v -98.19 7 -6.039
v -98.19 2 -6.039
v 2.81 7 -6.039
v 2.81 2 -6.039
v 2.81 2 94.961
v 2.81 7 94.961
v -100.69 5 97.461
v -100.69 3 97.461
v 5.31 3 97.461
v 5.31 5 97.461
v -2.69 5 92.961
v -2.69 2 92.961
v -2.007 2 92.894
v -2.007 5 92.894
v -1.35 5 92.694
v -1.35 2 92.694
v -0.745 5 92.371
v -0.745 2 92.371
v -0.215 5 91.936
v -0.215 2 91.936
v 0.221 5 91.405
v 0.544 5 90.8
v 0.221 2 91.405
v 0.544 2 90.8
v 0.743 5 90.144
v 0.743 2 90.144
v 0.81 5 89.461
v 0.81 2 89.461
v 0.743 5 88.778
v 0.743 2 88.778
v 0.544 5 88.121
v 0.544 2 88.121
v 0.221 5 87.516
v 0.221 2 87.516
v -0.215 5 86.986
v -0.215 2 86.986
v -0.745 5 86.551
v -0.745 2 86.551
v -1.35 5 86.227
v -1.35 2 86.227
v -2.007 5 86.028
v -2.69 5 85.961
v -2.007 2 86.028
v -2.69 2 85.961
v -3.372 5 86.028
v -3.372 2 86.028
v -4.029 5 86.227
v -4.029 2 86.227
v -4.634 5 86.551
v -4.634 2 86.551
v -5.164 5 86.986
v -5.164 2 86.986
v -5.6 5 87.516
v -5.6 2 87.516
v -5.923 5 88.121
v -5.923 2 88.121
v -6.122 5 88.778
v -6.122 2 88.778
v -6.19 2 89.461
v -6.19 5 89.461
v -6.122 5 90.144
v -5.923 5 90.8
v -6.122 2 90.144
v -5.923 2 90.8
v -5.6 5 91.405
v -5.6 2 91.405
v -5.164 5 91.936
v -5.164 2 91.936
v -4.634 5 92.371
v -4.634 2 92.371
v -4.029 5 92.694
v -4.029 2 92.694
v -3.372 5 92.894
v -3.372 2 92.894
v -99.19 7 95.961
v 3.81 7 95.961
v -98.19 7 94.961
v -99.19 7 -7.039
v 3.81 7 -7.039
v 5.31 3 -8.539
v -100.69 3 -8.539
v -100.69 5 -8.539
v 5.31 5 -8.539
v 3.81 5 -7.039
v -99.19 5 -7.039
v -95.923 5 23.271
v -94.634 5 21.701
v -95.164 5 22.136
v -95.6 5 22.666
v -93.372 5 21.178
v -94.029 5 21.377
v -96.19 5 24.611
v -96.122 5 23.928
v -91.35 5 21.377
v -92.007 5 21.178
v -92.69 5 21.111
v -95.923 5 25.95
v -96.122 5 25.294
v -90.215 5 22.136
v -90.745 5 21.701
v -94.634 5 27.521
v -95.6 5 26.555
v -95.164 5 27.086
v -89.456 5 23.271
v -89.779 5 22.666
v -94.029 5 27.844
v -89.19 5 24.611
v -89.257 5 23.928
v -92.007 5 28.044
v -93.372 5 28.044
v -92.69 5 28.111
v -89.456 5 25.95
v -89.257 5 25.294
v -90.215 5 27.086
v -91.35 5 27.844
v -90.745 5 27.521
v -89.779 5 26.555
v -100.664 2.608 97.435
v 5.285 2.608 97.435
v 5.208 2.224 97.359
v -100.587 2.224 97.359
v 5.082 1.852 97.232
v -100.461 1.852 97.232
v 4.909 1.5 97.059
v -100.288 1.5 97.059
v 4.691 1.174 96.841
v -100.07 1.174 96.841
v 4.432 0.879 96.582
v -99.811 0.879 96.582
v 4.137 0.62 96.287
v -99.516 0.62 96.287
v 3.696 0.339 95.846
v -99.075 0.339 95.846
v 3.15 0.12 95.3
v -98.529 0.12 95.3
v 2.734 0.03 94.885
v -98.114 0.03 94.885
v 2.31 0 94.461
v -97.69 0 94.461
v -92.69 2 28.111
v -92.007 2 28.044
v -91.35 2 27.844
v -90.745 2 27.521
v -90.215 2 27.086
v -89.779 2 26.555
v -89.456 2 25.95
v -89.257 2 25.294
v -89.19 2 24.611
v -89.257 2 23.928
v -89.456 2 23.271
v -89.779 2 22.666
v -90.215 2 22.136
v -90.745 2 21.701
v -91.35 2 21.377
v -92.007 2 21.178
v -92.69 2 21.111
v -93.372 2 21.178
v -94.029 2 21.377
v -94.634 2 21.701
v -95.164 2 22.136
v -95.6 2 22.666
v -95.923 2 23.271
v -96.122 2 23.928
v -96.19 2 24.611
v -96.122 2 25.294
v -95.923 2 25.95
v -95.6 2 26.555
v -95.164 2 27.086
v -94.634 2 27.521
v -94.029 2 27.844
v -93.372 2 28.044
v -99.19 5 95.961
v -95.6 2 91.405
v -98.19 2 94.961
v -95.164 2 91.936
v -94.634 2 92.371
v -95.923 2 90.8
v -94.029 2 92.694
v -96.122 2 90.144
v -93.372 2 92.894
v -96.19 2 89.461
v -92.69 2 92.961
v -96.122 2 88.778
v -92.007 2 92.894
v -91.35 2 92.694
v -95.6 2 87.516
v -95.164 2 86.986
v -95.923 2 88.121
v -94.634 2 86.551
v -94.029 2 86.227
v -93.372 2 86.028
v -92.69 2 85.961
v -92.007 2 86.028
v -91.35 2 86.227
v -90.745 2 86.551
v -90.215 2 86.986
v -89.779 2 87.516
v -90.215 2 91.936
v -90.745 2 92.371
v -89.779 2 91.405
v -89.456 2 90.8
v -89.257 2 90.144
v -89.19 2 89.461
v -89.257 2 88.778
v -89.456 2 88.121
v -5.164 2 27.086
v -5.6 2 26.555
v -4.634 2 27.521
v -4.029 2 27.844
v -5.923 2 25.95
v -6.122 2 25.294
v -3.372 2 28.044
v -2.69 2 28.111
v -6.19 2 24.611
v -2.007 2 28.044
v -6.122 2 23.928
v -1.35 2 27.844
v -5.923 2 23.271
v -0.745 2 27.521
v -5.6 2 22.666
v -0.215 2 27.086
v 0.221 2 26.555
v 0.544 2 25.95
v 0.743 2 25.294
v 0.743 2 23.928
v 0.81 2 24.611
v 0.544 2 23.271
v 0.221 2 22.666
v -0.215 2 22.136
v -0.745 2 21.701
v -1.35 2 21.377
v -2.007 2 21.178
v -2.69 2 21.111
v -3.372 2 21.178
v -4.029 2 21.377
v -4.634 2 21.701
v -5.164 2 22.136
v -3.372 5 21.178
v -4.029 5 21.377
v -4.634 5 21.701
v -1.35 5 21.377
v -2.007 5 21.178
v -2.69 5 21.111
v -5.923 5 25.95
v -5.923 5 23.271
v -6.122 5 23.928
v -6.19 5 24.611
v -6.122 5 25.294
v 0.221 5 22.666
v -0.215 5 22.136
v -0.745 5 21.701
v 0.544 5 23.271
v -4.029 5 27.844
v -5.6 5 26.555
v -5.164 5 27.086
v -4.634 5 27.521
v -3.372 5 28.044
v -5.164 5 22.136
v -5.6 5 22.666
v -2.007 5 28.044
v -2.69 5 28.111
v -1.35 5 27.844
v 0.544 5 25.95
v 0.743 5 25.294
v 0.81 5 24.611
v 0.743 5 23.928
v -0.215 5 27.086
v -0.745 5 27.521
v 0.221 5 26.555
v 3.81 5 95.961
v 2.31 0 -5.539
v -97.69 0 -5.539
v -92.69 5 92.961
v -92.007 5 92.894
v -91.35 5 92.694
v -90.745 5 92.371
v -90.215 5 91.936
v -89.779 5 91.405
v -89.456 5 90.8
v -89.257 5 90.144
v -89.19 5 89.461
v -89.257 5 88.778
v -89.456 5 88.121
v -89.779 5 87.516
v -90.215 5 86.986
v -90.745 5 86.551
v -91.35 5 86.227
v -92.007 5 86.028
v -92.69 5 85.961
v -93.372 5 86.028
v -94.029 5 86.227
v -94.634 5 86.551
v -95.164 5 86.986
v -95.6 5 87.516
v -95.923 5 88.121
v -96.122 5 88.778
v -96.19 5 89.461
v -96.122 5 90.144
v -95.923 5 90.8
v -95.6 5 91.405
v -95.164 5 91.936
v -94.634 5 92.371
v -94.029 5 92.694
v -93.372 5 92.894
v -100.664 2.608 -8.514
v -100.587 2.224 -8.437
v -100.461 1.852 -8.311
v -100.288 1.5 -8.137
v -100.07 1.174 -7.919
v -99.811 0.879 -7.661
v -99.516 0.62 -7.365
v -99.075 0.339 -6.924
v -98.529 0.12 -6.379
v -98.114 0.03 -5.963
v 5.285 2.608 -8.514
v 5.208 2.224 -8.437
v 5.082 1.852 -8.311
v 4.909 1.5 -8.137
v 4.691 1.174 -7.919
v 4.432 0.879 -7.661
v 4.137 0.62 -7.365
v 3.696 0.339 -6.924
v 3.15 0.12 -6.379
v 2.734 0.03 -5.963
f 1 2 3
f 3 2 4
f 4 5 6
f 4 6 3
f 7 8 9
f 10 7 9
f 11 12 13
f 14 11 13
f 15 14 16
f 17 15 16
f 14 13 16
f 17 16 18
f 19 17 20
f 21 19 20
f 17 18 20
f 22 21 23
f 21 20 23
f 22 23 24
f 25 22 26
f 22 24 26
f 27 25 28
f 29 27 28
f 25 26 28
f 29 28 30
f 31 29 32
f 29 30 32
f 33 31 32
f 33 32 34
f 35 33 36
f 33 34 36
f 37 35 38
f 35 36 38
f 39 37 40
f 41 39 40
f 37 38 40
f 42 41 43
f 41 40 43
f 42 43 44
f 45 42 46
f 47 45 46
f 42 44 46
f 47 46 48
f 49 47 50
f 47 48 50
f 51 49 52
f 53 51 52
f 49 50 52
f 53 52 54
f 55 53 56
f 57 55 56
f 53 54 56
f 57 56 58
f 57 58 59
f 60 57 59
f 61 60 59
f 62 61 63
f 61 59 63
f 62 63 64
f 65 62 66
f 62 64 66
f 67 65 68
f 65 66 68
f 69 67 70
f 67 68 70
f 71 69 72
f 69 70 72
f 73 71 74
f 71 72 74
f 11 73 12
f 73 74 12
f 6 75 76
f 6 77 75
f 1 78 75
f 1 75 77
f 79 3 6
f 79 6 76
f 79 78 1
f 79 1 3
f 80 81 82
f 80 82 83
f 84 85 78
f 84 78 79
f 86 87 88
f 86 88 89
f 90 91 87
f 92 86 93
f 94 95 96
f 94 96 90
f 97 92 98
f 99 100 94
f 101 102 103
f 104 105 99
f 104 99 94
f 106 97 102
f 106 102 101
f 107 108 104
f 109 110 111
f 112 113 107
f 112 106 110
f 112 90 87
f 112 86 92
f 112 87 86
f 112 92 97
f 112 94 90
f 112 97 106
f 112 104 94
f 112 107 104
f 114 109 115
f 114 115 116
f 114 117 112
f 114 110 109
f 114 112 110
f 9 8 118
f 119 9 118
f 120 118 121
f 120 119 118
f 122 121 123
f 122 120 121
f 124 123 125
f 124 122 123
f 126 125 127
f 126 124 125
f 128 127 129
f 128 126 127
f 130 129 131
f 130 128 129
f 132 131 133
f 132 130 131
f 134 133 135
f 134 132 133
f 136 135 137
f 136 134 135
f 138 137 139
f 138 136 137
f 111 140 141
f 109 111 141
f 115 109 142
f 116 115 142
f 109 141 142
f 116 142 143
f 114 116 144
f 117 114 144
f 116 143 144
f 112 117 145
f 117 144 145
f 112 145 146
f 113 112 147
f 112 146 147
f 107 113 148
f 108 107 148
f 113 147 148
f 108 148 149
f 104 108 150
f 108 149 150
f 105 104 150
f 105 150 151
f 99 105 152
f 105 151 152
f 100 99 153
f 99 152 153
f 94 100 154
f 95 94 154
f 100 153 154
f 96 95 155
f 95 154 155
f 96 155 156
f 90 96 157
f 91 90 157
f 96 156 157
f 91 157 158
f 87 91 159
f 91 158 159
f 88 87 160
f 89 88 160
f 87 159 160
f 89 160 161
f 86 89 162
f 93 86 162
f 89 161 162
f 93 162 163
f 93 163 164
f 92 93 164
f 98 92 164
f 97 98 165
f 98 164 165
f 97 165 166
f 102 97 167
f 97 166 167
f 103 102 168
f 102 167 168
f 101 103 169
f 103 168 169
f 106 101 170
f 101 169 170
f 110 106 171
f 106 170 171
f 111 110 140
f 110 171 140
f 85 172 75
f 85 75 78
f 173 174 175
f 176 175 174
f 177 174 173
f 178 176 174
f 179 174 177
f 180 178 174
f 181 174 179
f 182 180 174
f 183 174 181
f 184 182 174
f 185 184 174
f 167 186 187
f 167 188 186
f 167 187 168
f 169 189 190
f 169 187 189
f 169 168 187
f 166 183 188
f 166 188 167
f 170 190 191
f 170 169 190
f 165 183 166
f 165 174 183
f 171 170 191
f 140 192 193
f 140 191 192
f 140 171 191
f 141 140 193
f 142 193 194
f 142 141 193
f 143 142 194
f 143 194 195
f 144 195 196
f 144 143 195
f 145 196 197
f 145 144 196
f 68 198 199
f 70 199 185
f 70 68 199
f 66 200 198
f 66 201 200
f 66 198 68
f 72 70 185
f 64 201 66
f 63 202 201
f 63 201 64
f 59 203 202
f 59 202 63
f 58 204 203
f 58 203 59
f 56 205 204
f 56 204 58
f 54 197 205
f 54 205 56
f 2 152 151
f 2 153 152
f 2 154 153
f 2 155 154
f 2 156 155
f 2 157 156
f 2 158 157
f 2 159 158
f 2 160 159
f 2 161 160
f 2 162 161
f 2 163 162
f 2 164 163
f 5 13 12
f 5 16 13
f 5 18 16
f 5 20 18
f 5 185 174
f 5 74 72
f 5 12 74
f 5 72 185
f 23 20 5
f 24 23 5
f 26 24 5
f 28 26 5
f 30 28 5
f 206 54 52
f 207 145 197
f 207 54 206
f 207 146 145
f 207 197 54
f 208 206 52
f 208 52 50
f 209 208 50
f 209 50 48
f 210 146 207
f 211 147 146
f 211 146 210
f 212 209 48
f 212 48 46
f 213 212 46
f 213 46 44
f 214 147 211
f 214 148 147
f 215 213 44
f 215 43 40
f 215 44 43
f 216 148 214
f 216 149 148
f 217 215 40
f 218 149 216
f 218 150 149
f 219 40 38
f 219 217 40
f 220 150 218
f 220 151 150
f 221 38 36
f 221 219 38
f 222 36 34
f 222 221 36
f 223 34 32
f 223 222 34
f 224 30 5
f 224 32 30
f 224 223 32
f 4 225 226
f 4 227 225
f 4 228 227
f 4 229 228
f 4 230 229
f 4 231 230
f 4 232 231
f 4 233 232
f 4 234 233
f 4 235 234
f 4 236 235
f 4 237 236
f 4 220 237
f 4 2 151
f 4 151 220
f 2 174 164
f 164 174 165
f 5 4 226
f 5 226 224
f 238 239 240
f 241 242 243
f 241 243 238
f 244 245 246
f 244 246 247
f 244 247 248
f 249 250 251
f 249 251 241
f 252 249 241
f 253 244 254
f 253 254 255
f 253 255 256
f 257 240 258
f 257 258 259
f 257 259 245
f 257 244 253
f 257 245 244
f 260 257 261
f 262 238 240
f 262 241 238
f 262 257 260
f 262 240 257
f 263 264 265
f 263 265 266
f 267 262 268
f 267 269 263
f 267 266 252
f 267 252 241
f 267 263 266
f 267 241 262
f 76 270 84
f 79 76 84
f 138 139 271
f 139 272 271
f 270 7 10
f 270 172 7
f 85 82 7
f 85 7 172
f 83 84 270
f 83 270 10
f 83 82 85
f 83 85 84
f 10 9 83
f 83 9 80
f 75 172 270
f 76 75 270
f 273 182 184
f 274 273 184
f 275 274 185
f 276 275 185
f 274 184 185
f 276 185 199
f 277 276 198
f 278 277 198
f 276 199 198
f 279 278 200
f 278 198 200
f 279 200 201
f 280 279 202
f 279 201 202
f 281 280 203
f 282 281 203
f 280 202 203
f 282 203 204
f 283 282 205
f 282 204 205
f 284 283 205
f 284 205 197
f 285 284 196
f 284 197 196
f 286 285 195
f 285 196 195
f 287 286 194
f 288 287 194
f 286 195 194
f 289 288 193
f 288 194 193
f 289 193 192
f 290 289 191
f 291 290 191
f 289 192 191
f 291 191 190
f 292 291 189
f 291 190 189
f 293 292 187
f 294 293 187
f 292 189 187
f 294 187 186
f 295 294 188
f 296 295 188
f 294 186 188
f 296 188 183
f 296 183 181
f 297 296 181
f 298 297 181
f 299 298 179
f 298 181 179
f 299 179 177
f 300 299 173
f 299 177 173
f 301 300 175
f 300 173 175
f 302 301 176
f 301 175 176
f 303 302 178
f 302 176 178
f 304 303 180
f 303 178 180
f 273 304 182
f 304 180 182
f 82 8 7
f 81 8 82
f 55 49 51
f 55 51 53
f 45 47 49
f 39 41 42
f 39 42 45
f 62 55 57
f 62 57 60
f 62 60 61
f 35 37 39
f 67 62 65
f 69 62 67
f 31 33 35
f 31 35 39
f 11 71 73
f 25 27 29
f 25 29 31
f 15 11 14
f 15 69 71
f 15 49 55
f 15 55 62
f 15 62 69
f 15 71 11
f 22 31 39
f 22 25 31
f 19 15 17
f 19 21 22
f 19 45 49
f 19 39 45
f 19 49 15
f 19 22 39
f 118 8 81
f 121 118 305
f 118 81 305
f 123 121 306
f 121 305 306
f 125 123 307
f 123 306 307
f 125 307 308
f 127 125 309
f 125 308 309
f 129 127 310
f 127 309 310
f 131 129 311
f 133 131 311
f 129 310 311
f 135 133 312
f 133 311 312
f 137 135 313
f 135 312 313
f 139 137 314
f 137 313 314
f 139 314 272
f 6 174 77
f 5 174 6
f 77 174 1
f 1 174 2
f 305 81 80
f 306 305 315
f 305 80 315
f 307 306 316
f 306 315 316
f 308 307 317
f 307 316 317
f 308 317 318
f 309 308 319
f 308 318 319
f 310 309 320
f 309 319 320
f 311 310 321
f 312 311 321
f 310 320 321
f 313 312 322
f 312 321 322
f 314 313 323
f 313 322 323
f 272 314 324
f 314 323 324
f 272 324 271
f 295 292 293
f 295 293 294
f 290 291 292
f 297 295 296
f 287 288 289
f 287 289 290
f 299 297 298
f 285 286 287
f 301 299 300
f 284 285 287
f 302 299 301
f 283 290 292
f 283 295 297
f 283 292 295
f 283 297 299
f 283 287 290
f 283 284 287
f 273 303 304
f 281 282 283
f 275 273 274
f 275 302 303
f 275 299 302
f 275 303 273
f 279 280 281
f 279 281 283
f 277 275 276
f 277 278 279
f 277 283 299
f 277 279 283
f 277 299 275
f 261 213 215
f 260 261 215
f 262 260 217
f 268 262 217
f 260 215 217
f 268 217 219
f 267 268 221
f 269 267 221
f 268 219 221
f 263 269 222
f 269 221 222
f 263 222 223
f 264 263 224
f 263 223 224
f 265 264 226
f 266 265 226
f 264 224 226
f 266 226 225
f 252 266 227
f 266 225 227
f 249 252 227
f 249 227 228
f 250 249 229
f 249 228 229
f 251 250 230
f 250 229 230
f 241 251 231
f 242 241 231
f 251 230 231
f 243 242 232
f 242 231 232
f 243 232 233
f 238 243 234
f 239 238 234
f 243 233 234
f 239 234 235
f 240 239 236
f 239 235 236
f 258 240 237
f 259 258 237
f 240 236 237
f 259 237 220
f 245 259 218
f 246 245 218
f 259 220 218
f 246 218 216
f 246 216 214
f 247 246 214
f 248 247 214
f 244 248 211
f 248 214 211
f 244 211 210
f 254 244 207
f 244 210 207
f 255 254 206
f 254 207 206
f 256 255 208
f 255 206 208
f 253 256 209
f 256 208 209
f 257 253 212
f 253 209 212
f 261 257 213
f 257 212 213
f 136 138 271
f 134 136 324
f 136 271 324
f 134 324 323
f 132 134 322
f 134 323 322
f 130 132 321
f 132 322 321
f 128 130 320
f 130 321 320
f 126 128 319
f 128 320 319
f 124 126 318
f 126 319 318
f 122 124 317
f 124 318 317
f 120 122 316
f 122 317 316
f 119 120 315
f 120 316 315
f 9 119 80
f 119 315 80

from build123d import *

# Parameters (mm, degrees)
SKETCH4_W           = 106
SKETCH4_H           = 106
BOSS_EXTRUDE3_DEPTH = 5
SKETCH6_W           = 101
SKETCH6_H           = 101
CUT_EXTRUDE2_DEPTH  = 3
SKETCH7_R           = 3.5
BOSS_EXTRUDE4_DEPTH = 3
FILLET1_R           = 3
SKETCH10_W          = 103
SKETCH10_H          = 103
SKETCH10_W_2        = 101
SKETCH10_H_2        = 101
BOSS_EXTRUDE5_DEPTH = 2


with BuildPart() as part:
    # Sketch4 → Boss-Extrude3 (new body)
    with BuildSketch(Plane(origin=(0, 0, 0), x_dir=(1, 0, 0), z_dir=(0, 1, 0))):
        with Locations((-47.689542484, -44.460784314)):
            Rectangle(SKETCH4_W, SKETCH4_H)
    extrude(amount=BOSS_EXTRUDE3_DEPTH)

    # Sketch6 → Cut-Extrude2 (cut)
    with BuildSketch(Plane(origin=(0, 5, 0), x_dir=(1, 0, 0), z_dir=(0, 1, 0))):
        with Locations((-47.689542484, -44.460784314)):
            Rectangle(SKETCH6_W, SKETCH6_H)
    extrude(amount=-CUT_EXTRUDE2_DEPTH, mode=Mode.SUBTRACT)

    # Sketch7 → Boss-Extrude4 (add)
    with BuildSketch(Plane(origin=(0, 2, 0), x_dir=(1, 0, 0), z_dir=(0, 1, 0))):
        with Locations(Location((-92.689542484, -24.610784314, 0), (0, 0, 270))):
            Circle(SKETCH7_R)
        with Locations(Location((-92.689542484, -89.460784314, 0), (0, 0, 270))):
            Circle(SKETCH7_R)
        with Locations(Location((-2.689542484, -89.460784314, 0), (0, 0, 270))):
            Circle(SKETCH7_R)
        with Locations(Location((-2.689542484, -24.610784314, 0), (0, 0, 270))):
            Circle(SKETCH7_R)
    extrude(amount=BOSS_EXTRUDE4_DEPTH)

    # Fillet1
    fillet1_edges = [part.edges().sort_by_distance(p)[0] for p in [
        (-47.689542484, 0, 97.460784314),
        (-100.689542484, 0, 44.460784314),
        (-47.689542484, 0, -8.539215686),
        (5.310457516, 0, 44.460784314),
    ]]
    fillet(fillet1_edges, radius=FILLET1_R)

    # Sketch10 → Boss-Extrude5 (add)
    with BuildSketch(Plane(origin=(0, 5, 0), x_dir=(1, 0, 0), z_dir=(0, 1, 0))):
        with Locations((-47.689542484, -44.460784314)):
            Rectangle(SKETCH10_W, SKETCH10_H)
        with Locations((-47.689542484, -44.460784314)):
            Rectangle(SKETCH10_W_2, SKETCH10_H_2, mode=Mode.SUBTRACT)
    extrude(amount=BOSS_EXTRUDE5_DEPTH)


solid = part.part
